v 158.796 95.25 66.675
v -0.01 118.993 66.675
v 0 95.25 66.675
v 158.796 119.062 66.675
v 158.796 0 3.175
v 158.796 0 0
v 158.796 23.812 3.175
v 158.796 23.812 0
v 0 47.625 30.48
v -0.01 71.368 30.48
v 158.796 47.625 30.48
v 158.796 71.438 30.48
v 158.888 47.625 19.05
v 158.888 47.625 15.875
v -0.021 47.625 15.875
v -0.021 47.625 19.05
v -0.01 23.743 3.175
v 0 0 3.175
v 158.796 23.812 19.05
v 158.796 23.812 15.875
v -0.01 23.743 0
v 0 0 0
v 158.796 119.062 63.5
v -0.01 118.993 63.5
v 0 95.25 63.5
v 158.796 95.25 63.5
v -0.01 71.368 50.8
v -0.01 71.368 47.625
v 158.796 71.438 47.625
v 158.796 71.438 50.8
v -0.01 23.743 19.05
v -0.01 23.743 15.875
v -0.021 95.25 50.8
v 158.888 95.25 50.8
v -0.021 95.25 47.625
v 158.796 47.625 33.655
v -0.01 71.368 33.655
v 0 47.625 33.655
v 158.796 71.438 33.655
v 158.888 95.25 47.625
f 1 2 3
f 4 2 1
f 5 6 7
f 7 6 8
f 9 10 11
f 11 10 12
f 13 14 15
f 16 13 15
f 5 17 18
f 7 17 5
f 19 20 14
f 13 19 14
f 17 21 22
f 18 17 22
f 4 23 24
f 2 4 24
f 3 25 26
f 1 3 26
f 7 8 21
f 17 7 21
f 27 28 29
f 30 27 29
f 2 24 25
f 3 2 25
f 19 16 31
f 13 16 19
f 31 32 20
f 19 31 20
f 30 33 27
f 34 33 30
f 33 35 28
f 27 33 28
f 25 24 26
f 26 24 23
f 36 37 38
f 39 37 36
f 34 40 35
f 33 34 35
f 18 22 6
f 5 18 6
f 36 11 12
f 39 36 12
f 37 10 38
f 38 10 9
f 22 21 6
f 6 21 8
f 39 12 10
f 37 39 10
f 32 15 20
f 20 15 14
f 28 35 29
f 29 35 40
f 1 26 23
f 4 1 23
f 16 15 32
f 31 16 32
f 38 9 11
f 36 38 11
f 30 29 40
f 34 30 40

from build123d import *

# Parameters (mm, degrees)
F0_W     = 15.875
F0_H     = 15.875
F1_DEPTH = 3.175
F2_START = 15.875
F0_W_2   = 15.9210213366
F2_DEPTH = 3.175
F3_START = 30.48
F3_DEPTH = 3.175
F4_START = 47.625
F4_DEPTH = 3.175
F5_START = 63.5
F5_DEPTH = 3.175


with BuildPart() as f1:
    # F0 (on Top) → F1 (new body)
    with BuildSketch(Plane.XY):
        Polygon((-0.0104455087, 23.7426335154), (0, 0), (0, 15.875), (15.875, 15.875), (15.875, 0), (31.75, 0), (31.75, 15.875), (47.625, 15.875), (47.625, 0), (63.5, 0), (63.5, 15.875), (79.375, 15.875), (79.375, 0), (95.25, 0), (95.25, 15.875), (111.125, 15.875), (111.125, 0), (127, 0), (127, 15.875), (142.875, 15.875), (142.875, 0), (158.7960213366, 0), (158.7960213366, 23.8125), align=None)
        with Locations((7.9375, 7.9375)):
            Rectangle(F0_W, F0_H)
        with Locations((39.6875, 7.9375)):
            Rectangle(F0_W, F0_H)
        with Locations((71.4375, 7.9375)):
            Rectangle(F0_W, F0_H)
        with Locations((103.1875, 7.9375)):
            Rectangle(F0_W, F0_H)
        with Locations((134.9375, 7.9375)):
            Rectangle(F0_W, F0_H)
    extrude(amount=F1_DEPTH)


with BuildPart() as f2:
    # F0 (on Top) → F2 (new body)
    with BuildSketch(Plane.XY.offset(F2_START)):
        Polygon((-0.0209524146, 47.6248225997), (-0.0104455087, 23.7426335154), (158.7960213366, 23.8125), (158.8879379052, 47.6248225997), align=None)
        with Locations((23.8355106683, 31.75)):
            Rectangle(F0_W_2, F0_H, mode=Mode.SUBTRACT)
        with Locations((55.5855106683, 31.75)):
            Rectangle(F0_W_2, F0_H, mode=Mode.SUBTRACT)
        with Locations((87.3355106683, 31.75)):
            Rectangle(F0_W_2, F0_H, mode=Mode.SUBTRACT)
        with Locations((119.0855106683, 31.75)):
            Rectangle(F0_W_2, F0_H, mode=Mode.SUBTRACT)
        with Locations((150.8355106683, 31.75)):
            Rectangle(F0_W_2, F0_H, mode=Mode.SUBTRACT)
        with Locations((23.8355106683, 31.75)):
            Rectangle(F0_W_2, F0_H)
        with Locations((55.5855106683, 31.75)):
            Rectangle(F0_W_2, F0_H)
        with Locations((87.3355106683, 31.75)):
            Rectangle(F0_W_2, F0_H)
        with Locations((119.0855106683, 31.75)):
            Rectangle(F0_W_2, F0_H)
        with Locations((150.8355106683, 31.75)):
            Rectangle(F0_W_2, F0_H)
    extrude(amount=F2_DEPTH)


with BuildPart() as f3:
    # F0 (on Top) → F3 (new body)
    with BuildSketch(Plane.XY.offset(F3_START)):
        Polygon((158.7960213366, 47.625), (158.7960213366, 71.4375), (-0.0104455087, 71.3676335154), (0, 47.625), (0, 63.5), (15.875, 63.5), (15.875, 47.625), (31.75, 47.625), (31.75, 63.5), (47.625, 63.5), (47.625, 47.625), (63.5, 47.625), (63.5, 63.5), (79.375, 63.5), (79.375, 47.625), (95.25, 47.625), (95.25, 63.5), (111.125, 63.5), (111.125, 47.625), (127, 47.625), (127, 63.5), (142.875, 63.5), (142.875, 47.625), align=None)
        with Locations((7.9375, 55.5625)):
            Rectangle(F0_W, F0_H)
        with Locations((39.6875, 55.5625)):
            Rectangle(F0_W, F0_H)
        with Locations((71.4375, 55.5625)):
            Rectangle(F0_W, F0_H)
        with Locations((103.1875, 55.5625)):
            Rectangle(F0_W, F0_H)
        with Locations((134.9375, 55.5625)):
            Rectangle(F0_W, F0_H)
    extrude(amount=F3_DEPTH)


with BuildPart() as f4:
    # F0 (on Top) → F4 (new body)
    with BuildSketch(Plane.XY.offset(F4_START)):
        Polygon((-0.0104455087, 71.3676335154), (158.7960213366, 71.4375), (158.8879379052, 95.2498225997), (-0.0209524146, 95.2498225997), align=None)
        with Locations((23.8355106683, 79.375)):
            Rectangle(F0_W_2, F0_H, mode=Mode.SUBTRACT)
        with Locations((55.5855106683, 79.375)):
            Rectangle(F0_W_2, F0_H, mode=Mode.SUBTRACT)
        with Locations((87.3355106683, 79.375)):
            Rectangle(F0_W_2, F0_H, mode=Mode.SUBTRACT)
        with Locations((119.0855106683, 79.375)):
            Rectangle(F0_W_2, F0_H, mode=Mode.SUBTRACT)
        with Locations((150.8355106683, 79.375)):
            Rectangle(F0_W_2, F0_H, mode=Mode.SUBTRACT)
        with Locations((23.8355106683, 79.375)):
            Rectangle(F0_W_2, F0_H)
        with Locations((55.5855106683, 79.375)):
            Rectangle(F0_W_2, F0_H)
        with Locations((87.3355106683, 79.375)):
            Rectangle(F0_W_2, F0_H)
        with Locations((119.0855106683, 79.375)):
            Rectangle(F0_W_2, F0_H)
        with Locations((150.8355106683, 79.375)):
            Rectangle(F0_W_2, F0_H)
    extrude(amount=F4_DEPTH)


with BuildPart() as f5:
    # F0 (on Top) → F5 (new body)
    with BuildSketch(Plane.XY.offset(F5_START)):
        with Locations((7.9375, 103.1875)):
            Rectangle(F0_W, F0_H)
        Polygon((142.875, 111.125), (142.875, 95.25), (158.7960213366, 95.25), (158.7960213366, 119.0625), (-0.0104455087, 118.9926335154), (0, 95.25), (0, 111.125), (15.875, 111.125), (15.875, 95.25), (31.75, 95.25), (31.75, 111.125), (47.625, 111.125), (47.625, 95.25), (63.5, 95.25), (63.5, 111.125), (79.375, 111.125), (79.375, 95.25), (95.25, 95.25), (95.25, 111.125), (111.125, 111.125), (111.125, 95.25), (127, 95.25), (127, 111.125), align=None)
        with Locations((39.6875, 103.1875)):
            Rectangle(F0_W, F0_H)
        with Locations((71.4375, 103.1875)):
            Rectangle(F0_W, F0_H)
        with Locations((103.1875, 103.1875)):
            Rectangle(F0_W, F0_H)
        with Locations((134.9375, 103.1875)):
            Rectangle(F0_W, F0_H)
    extrude(amount=F5_DEPTH)


solid = Compound([f1.part, f2.part, f3.part, f4.part, f5.part])
